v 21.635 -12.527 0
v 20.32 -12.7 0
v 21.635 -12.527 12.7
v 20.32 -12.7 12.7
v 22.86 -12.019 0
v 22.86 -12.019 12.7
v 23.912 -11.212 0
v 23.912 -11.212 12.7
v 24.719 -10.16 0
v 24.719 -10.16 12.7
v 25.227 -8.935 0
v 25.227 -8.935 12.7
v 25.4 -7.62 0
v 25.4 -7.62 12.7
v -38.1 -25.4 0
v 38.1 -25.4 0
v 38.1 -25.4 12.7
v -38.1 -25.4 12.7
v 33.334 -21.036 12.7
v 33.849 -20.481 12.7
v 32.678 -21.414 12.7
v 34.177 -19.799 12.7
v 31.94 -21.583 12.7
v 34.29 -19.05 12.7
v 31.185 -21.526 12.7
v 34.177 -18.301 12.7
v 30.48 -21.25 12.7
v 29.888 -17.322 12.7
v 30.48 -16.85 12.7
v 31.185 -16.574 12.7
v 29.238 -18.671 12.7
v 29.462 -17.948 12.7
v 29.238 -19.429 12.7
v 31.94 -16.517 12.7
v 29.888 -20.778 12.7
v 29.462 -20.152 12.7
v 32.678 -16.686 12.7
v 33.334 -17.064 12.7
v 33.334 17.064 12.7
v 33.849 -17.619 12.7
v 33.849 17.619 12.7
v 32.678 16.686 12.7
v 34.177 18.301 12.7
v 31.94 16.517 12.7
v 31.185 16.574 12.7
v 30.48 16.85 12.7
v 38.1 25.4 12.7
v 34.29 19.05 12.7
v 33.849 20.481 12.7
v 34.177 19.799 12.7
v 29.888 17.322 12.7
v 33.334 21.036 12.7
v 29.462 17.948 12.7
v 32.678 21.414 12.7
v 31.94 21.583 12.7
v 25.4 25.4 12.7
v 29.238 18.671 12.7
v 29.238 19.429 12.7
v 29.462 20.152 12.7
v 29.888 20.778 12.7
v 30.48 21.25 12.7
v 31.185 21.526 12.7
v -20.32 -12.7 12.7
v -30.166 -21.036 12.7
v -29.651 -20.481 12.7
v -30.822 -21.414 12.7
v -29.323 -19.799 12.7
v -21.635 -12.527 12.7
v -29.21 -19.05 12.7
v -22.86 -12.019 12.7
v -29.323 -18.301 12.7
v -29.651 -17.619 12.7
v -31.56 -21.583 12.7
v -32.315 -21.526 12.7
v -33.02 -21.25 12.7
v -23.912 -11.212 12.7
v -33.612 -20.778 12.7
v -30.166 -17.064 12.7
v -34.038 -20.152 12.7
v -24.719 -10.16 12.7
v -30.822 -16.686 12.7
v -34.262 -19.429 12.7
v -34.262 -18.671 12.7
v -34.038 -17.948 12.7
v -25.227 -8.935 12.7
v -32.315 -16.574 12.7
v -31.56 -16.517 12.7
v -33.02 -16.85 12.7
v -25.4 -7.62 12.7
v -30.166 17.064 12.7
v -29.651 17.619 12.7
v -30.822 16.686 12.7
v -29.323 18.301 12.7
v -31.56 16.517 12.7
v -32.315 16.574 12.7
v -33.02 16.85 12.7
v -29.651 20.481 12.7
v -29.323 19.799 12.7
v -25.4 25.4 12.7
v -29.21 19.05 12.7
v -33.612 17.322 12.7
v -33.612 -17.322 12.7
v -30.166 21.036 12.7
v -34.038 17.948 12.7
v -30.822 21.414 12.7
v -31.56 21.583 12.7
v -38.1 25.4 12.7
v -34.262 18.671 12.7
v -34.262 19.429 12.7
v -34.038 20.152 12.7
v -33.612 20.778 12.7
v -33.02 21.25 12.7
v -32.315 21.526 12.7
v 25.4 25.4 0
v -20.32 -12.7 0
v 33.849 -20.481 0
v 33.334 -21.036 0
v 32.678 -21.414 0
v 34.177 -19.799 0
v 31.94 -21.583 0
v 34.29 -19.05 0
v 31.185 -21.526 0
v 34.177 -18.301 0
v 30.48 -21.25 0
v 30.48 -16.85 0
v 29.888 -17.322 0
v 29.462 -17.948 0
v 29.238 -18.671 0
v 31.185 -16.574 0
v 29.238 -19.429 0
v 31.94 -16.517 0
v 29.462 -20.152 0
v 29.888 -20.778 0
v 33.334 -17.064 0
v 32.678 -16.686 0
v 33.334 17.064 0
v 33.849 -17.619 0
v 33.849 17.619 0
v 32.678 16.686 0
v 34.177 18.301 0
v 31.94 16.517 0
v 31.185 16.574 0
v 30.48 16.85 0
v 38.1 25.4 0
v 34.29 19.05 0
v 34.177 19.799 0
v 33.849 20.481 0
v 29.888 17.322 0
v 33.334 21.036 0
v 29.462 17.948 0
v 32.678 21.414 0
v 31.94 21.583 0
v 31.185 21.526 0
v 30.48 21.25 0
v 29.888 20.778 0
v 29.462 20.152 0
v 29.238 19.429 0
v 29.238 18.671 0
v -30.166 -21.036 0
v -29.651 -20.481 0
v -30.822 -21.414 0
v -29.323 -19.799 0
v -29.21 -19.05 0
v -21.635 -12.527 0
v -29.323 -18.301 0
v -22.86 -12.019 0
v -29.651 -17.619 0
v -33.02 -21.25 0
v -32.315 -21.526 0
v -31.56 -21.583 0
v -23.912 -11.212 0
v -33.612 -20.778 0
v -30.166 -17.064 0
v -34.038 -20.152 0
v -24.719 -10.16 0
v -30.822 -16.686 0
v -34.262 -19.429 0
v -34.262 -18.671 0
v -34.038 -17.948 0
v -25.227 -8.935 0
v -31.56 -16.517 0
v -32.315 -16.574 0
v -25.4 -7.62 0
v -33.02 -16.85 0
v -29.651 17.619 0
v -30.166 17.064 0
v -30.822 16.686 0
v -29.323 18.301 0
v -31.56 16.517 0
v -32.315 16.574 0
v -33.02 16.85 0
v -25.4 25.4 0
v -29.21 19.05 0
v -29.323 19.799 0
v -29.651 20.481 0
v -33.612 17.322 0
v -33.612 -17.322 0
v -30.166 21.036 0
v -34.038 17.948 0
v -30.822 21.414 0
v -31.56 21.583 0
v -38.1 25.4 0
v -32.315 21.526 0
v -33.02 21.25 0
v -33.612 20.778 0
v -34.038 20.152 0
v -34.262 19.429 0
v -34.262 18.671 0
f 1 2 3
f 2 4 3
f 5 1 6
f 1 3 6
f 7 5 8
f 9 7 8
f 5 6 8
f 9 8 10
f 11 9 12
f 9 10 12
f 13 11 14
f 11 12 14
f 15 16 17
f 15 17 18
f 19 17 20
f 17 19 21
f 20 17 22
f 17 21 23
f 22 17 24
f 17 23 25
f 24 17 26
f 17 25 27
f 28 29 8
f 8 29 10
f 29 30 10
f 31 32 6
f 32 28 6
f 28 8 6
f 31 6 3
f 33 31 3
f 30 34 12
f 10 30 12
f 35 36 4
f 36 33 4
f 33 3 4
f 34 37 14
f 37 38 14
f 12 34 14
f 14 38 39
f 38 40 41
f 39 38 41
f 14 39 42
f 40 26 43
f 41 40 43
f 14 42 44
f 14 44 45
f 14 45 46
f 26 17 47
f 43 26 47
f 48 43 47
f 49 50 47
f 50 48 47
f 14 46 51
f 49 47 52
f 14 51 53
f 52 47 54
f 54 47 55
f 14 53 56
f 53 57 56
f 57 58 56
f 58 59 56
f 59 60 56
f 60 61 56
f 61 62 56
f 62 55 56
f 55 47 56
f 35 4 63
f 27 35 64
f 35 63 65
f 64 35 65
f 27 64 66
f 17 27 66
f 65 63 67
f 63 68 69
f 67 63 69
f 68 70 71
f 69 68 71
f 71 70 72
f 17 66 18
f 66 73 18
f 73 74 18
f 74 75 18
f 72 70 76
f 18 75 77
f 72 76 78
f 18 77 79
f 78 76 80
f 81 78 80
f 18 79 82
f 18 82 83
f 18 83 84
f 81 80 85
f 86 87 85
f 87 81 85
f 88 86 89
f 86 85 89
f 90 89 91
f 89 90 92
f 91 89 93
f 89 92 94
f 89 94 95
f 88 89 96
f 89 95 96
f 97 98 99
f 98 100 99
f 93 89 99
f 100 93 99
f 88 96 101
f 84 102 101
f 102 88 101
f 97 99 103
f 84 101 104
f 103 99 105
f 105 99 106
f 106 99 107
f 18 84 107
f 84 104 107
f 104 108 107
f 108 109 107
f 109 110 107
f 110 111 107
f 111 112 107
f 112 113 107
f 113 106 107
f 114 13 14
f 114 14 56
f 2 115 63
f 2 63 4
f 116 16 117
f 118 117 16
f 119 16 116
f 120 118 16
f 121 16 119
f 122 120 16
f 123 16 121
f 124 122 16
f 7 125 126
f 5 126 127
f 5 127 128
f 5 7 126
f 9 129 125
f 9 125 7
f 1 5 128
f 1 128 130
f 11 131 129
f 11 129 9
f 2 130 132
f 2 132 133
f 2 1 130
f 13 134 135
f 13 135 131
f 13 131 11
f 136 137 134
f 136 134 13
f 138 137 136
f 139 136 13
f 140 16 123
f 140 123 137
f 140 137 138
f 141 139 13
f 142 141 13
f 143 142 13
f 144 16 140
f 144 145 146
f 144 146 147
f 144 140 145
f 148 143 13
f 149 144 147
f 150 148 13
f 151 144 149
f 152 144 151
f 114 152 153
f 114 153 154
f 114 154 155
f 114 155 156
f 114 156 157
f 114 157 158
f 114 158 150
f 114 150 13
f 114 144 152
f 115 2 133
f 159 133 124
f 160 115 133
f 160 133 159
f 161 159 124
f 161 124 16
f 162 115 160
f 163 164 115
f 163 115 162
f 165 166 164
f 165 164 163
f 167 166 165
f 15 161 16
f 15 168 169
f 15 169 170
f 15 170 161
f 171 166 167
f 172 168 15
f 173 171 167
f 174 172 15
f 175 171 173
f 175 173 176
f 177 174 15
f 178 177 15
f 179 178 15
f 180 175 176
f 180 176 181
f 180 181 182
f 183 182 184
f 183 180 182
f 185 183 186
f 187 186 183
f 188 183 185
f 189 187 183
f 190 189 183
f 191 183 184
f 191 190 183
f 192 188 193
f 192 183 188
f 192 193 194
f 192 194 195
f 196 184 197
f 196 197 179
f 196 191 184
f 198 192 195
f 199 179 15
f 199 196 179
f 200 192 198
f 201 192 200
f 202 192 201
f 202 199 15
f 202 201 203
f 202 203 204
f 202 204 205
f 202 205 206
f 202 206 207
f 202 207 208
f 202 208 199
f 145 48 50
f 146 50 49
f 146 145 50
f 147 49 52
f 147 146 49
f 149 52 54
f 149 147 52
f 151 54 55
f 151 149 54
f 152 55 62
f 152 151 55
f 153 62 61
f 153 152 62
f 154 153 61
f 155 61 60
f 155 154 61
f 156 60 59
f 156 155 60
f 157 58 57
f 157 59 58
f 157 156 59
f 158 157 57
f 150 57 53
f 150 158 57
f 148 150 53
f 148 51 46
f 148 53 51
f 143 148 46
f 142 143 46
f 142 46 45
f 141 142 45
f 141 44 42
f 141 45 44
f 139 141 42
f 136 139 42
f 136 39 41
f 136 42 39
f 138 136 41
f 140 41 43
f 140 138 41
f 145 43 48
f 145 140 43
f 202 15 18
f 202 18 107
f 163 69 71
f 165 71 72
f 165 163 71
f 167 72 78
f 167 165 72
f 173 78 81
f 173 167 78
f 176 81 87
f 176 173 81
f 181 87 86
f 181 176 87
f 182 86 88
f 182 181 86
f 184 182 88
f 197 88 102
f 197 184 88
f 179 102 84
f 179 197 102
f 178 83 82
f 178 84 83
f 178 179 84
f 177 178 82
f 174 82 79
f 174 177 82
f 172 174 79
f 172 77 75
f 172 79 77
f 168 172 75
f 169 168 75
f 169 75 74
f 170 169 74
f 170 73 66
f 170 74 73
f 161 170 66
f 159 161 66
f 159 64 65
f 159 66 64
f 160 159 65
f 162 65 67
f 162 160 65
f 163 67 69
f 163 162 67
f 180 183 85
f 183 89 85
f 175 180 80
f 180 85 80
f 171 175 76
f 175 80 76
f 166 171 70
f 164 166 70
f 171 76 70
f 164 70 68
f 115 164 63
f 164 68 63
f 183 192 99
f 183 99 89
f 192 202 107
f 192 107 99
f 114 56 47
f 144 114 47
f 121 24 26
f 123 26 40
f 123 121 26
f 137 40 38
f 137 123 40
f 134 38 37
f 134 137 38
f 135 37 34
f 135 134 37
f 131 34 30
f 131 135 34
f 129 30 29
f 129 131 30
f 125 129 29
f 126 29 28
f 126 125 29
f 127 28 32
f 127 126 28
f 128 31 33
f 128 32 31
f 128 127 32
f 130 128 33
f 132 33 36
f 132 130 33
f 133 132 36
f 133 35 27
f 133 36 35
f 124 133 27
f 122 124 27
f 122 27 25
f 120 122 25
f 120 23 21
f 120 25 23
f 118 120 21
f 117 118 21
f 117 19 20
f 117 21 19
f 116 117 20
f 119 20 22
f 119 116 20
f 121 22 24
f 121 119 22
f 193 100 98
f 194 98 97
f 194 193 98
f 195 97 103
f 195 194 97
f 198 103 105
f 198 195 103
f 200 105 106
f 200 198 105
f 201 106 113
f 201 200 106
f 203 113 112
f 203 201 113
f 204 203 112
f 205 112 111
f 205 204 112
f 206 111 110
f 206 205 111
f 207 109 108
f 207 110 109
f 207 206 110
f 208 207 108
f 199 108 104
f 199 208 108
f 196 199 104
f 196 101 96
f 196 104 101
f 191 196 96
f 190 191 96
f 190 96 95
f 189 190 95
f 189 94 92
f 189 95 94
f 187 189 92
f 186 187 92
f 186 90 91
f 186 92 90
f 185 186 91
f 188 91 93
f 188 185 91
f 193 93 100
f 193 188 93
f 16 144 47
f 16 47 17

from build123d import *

# Parameters (mm, degrees)
BOSS_EXTRUDE1_DEPTH     = 12.7
SKETCH4_R               = 2.54
CUT_EXTRUDE3_DEPTH      = 13.7
CUT_EXTRUDE3_DEPTH_BACK = 1
FILLET1_R               = 5.08


with BuildPart() as part:
    # Sketch2 → Boss-Extrude1 (new body)
    with BuildSketch(Plane.XY):
        Polygon((-25.4, 25.4), (-25.4, -12.7), (25.4, -12.7), (25.4, 25.4), (38.1, 25.4), (38.1, -25.4), (-38.1, -25.4), (-38.1, 25.4), align=None)
    extrude(amount=BOSS_EXTRUDE1_DEPTH)

    # Sketch4 → Cut-Extrude3 (cut, two sides)
    with BuildSketch(Plane.XY) as cut_extrude3_sk:
        with Locations((-31.75, 19.05)):
            Circle(SKETCH4_R)
        with Locations((31.75, 19.05)):
            Circle(SKETCH4_R)
        with Locations((31.75, -19.05)):
            Circle(SKETCH4_R)
        with Locations((-31.75, -19.05)):
            Circle(SKETCH4_R)
    extrude(amount=CUT_EXTRUDE3_DEPTH, mode=Mode.SUBTRACT)
    extrude(cut_extrude3_sk.sketch, amount=-CUT_EXTRUDE3_DEPTH_BACK, mode=Mode.SUBTRACT)

    # Fillet1
    fillet1_edges = [part.edges().sort_by_distance(p)[0] for p in [
        (-25.4, -12.7, 6.35),
        (25.4, -12.7, 6.35),
    ]]
    fillet(fillet1_edges, radius=FILLET1_R)


solid = part.part
